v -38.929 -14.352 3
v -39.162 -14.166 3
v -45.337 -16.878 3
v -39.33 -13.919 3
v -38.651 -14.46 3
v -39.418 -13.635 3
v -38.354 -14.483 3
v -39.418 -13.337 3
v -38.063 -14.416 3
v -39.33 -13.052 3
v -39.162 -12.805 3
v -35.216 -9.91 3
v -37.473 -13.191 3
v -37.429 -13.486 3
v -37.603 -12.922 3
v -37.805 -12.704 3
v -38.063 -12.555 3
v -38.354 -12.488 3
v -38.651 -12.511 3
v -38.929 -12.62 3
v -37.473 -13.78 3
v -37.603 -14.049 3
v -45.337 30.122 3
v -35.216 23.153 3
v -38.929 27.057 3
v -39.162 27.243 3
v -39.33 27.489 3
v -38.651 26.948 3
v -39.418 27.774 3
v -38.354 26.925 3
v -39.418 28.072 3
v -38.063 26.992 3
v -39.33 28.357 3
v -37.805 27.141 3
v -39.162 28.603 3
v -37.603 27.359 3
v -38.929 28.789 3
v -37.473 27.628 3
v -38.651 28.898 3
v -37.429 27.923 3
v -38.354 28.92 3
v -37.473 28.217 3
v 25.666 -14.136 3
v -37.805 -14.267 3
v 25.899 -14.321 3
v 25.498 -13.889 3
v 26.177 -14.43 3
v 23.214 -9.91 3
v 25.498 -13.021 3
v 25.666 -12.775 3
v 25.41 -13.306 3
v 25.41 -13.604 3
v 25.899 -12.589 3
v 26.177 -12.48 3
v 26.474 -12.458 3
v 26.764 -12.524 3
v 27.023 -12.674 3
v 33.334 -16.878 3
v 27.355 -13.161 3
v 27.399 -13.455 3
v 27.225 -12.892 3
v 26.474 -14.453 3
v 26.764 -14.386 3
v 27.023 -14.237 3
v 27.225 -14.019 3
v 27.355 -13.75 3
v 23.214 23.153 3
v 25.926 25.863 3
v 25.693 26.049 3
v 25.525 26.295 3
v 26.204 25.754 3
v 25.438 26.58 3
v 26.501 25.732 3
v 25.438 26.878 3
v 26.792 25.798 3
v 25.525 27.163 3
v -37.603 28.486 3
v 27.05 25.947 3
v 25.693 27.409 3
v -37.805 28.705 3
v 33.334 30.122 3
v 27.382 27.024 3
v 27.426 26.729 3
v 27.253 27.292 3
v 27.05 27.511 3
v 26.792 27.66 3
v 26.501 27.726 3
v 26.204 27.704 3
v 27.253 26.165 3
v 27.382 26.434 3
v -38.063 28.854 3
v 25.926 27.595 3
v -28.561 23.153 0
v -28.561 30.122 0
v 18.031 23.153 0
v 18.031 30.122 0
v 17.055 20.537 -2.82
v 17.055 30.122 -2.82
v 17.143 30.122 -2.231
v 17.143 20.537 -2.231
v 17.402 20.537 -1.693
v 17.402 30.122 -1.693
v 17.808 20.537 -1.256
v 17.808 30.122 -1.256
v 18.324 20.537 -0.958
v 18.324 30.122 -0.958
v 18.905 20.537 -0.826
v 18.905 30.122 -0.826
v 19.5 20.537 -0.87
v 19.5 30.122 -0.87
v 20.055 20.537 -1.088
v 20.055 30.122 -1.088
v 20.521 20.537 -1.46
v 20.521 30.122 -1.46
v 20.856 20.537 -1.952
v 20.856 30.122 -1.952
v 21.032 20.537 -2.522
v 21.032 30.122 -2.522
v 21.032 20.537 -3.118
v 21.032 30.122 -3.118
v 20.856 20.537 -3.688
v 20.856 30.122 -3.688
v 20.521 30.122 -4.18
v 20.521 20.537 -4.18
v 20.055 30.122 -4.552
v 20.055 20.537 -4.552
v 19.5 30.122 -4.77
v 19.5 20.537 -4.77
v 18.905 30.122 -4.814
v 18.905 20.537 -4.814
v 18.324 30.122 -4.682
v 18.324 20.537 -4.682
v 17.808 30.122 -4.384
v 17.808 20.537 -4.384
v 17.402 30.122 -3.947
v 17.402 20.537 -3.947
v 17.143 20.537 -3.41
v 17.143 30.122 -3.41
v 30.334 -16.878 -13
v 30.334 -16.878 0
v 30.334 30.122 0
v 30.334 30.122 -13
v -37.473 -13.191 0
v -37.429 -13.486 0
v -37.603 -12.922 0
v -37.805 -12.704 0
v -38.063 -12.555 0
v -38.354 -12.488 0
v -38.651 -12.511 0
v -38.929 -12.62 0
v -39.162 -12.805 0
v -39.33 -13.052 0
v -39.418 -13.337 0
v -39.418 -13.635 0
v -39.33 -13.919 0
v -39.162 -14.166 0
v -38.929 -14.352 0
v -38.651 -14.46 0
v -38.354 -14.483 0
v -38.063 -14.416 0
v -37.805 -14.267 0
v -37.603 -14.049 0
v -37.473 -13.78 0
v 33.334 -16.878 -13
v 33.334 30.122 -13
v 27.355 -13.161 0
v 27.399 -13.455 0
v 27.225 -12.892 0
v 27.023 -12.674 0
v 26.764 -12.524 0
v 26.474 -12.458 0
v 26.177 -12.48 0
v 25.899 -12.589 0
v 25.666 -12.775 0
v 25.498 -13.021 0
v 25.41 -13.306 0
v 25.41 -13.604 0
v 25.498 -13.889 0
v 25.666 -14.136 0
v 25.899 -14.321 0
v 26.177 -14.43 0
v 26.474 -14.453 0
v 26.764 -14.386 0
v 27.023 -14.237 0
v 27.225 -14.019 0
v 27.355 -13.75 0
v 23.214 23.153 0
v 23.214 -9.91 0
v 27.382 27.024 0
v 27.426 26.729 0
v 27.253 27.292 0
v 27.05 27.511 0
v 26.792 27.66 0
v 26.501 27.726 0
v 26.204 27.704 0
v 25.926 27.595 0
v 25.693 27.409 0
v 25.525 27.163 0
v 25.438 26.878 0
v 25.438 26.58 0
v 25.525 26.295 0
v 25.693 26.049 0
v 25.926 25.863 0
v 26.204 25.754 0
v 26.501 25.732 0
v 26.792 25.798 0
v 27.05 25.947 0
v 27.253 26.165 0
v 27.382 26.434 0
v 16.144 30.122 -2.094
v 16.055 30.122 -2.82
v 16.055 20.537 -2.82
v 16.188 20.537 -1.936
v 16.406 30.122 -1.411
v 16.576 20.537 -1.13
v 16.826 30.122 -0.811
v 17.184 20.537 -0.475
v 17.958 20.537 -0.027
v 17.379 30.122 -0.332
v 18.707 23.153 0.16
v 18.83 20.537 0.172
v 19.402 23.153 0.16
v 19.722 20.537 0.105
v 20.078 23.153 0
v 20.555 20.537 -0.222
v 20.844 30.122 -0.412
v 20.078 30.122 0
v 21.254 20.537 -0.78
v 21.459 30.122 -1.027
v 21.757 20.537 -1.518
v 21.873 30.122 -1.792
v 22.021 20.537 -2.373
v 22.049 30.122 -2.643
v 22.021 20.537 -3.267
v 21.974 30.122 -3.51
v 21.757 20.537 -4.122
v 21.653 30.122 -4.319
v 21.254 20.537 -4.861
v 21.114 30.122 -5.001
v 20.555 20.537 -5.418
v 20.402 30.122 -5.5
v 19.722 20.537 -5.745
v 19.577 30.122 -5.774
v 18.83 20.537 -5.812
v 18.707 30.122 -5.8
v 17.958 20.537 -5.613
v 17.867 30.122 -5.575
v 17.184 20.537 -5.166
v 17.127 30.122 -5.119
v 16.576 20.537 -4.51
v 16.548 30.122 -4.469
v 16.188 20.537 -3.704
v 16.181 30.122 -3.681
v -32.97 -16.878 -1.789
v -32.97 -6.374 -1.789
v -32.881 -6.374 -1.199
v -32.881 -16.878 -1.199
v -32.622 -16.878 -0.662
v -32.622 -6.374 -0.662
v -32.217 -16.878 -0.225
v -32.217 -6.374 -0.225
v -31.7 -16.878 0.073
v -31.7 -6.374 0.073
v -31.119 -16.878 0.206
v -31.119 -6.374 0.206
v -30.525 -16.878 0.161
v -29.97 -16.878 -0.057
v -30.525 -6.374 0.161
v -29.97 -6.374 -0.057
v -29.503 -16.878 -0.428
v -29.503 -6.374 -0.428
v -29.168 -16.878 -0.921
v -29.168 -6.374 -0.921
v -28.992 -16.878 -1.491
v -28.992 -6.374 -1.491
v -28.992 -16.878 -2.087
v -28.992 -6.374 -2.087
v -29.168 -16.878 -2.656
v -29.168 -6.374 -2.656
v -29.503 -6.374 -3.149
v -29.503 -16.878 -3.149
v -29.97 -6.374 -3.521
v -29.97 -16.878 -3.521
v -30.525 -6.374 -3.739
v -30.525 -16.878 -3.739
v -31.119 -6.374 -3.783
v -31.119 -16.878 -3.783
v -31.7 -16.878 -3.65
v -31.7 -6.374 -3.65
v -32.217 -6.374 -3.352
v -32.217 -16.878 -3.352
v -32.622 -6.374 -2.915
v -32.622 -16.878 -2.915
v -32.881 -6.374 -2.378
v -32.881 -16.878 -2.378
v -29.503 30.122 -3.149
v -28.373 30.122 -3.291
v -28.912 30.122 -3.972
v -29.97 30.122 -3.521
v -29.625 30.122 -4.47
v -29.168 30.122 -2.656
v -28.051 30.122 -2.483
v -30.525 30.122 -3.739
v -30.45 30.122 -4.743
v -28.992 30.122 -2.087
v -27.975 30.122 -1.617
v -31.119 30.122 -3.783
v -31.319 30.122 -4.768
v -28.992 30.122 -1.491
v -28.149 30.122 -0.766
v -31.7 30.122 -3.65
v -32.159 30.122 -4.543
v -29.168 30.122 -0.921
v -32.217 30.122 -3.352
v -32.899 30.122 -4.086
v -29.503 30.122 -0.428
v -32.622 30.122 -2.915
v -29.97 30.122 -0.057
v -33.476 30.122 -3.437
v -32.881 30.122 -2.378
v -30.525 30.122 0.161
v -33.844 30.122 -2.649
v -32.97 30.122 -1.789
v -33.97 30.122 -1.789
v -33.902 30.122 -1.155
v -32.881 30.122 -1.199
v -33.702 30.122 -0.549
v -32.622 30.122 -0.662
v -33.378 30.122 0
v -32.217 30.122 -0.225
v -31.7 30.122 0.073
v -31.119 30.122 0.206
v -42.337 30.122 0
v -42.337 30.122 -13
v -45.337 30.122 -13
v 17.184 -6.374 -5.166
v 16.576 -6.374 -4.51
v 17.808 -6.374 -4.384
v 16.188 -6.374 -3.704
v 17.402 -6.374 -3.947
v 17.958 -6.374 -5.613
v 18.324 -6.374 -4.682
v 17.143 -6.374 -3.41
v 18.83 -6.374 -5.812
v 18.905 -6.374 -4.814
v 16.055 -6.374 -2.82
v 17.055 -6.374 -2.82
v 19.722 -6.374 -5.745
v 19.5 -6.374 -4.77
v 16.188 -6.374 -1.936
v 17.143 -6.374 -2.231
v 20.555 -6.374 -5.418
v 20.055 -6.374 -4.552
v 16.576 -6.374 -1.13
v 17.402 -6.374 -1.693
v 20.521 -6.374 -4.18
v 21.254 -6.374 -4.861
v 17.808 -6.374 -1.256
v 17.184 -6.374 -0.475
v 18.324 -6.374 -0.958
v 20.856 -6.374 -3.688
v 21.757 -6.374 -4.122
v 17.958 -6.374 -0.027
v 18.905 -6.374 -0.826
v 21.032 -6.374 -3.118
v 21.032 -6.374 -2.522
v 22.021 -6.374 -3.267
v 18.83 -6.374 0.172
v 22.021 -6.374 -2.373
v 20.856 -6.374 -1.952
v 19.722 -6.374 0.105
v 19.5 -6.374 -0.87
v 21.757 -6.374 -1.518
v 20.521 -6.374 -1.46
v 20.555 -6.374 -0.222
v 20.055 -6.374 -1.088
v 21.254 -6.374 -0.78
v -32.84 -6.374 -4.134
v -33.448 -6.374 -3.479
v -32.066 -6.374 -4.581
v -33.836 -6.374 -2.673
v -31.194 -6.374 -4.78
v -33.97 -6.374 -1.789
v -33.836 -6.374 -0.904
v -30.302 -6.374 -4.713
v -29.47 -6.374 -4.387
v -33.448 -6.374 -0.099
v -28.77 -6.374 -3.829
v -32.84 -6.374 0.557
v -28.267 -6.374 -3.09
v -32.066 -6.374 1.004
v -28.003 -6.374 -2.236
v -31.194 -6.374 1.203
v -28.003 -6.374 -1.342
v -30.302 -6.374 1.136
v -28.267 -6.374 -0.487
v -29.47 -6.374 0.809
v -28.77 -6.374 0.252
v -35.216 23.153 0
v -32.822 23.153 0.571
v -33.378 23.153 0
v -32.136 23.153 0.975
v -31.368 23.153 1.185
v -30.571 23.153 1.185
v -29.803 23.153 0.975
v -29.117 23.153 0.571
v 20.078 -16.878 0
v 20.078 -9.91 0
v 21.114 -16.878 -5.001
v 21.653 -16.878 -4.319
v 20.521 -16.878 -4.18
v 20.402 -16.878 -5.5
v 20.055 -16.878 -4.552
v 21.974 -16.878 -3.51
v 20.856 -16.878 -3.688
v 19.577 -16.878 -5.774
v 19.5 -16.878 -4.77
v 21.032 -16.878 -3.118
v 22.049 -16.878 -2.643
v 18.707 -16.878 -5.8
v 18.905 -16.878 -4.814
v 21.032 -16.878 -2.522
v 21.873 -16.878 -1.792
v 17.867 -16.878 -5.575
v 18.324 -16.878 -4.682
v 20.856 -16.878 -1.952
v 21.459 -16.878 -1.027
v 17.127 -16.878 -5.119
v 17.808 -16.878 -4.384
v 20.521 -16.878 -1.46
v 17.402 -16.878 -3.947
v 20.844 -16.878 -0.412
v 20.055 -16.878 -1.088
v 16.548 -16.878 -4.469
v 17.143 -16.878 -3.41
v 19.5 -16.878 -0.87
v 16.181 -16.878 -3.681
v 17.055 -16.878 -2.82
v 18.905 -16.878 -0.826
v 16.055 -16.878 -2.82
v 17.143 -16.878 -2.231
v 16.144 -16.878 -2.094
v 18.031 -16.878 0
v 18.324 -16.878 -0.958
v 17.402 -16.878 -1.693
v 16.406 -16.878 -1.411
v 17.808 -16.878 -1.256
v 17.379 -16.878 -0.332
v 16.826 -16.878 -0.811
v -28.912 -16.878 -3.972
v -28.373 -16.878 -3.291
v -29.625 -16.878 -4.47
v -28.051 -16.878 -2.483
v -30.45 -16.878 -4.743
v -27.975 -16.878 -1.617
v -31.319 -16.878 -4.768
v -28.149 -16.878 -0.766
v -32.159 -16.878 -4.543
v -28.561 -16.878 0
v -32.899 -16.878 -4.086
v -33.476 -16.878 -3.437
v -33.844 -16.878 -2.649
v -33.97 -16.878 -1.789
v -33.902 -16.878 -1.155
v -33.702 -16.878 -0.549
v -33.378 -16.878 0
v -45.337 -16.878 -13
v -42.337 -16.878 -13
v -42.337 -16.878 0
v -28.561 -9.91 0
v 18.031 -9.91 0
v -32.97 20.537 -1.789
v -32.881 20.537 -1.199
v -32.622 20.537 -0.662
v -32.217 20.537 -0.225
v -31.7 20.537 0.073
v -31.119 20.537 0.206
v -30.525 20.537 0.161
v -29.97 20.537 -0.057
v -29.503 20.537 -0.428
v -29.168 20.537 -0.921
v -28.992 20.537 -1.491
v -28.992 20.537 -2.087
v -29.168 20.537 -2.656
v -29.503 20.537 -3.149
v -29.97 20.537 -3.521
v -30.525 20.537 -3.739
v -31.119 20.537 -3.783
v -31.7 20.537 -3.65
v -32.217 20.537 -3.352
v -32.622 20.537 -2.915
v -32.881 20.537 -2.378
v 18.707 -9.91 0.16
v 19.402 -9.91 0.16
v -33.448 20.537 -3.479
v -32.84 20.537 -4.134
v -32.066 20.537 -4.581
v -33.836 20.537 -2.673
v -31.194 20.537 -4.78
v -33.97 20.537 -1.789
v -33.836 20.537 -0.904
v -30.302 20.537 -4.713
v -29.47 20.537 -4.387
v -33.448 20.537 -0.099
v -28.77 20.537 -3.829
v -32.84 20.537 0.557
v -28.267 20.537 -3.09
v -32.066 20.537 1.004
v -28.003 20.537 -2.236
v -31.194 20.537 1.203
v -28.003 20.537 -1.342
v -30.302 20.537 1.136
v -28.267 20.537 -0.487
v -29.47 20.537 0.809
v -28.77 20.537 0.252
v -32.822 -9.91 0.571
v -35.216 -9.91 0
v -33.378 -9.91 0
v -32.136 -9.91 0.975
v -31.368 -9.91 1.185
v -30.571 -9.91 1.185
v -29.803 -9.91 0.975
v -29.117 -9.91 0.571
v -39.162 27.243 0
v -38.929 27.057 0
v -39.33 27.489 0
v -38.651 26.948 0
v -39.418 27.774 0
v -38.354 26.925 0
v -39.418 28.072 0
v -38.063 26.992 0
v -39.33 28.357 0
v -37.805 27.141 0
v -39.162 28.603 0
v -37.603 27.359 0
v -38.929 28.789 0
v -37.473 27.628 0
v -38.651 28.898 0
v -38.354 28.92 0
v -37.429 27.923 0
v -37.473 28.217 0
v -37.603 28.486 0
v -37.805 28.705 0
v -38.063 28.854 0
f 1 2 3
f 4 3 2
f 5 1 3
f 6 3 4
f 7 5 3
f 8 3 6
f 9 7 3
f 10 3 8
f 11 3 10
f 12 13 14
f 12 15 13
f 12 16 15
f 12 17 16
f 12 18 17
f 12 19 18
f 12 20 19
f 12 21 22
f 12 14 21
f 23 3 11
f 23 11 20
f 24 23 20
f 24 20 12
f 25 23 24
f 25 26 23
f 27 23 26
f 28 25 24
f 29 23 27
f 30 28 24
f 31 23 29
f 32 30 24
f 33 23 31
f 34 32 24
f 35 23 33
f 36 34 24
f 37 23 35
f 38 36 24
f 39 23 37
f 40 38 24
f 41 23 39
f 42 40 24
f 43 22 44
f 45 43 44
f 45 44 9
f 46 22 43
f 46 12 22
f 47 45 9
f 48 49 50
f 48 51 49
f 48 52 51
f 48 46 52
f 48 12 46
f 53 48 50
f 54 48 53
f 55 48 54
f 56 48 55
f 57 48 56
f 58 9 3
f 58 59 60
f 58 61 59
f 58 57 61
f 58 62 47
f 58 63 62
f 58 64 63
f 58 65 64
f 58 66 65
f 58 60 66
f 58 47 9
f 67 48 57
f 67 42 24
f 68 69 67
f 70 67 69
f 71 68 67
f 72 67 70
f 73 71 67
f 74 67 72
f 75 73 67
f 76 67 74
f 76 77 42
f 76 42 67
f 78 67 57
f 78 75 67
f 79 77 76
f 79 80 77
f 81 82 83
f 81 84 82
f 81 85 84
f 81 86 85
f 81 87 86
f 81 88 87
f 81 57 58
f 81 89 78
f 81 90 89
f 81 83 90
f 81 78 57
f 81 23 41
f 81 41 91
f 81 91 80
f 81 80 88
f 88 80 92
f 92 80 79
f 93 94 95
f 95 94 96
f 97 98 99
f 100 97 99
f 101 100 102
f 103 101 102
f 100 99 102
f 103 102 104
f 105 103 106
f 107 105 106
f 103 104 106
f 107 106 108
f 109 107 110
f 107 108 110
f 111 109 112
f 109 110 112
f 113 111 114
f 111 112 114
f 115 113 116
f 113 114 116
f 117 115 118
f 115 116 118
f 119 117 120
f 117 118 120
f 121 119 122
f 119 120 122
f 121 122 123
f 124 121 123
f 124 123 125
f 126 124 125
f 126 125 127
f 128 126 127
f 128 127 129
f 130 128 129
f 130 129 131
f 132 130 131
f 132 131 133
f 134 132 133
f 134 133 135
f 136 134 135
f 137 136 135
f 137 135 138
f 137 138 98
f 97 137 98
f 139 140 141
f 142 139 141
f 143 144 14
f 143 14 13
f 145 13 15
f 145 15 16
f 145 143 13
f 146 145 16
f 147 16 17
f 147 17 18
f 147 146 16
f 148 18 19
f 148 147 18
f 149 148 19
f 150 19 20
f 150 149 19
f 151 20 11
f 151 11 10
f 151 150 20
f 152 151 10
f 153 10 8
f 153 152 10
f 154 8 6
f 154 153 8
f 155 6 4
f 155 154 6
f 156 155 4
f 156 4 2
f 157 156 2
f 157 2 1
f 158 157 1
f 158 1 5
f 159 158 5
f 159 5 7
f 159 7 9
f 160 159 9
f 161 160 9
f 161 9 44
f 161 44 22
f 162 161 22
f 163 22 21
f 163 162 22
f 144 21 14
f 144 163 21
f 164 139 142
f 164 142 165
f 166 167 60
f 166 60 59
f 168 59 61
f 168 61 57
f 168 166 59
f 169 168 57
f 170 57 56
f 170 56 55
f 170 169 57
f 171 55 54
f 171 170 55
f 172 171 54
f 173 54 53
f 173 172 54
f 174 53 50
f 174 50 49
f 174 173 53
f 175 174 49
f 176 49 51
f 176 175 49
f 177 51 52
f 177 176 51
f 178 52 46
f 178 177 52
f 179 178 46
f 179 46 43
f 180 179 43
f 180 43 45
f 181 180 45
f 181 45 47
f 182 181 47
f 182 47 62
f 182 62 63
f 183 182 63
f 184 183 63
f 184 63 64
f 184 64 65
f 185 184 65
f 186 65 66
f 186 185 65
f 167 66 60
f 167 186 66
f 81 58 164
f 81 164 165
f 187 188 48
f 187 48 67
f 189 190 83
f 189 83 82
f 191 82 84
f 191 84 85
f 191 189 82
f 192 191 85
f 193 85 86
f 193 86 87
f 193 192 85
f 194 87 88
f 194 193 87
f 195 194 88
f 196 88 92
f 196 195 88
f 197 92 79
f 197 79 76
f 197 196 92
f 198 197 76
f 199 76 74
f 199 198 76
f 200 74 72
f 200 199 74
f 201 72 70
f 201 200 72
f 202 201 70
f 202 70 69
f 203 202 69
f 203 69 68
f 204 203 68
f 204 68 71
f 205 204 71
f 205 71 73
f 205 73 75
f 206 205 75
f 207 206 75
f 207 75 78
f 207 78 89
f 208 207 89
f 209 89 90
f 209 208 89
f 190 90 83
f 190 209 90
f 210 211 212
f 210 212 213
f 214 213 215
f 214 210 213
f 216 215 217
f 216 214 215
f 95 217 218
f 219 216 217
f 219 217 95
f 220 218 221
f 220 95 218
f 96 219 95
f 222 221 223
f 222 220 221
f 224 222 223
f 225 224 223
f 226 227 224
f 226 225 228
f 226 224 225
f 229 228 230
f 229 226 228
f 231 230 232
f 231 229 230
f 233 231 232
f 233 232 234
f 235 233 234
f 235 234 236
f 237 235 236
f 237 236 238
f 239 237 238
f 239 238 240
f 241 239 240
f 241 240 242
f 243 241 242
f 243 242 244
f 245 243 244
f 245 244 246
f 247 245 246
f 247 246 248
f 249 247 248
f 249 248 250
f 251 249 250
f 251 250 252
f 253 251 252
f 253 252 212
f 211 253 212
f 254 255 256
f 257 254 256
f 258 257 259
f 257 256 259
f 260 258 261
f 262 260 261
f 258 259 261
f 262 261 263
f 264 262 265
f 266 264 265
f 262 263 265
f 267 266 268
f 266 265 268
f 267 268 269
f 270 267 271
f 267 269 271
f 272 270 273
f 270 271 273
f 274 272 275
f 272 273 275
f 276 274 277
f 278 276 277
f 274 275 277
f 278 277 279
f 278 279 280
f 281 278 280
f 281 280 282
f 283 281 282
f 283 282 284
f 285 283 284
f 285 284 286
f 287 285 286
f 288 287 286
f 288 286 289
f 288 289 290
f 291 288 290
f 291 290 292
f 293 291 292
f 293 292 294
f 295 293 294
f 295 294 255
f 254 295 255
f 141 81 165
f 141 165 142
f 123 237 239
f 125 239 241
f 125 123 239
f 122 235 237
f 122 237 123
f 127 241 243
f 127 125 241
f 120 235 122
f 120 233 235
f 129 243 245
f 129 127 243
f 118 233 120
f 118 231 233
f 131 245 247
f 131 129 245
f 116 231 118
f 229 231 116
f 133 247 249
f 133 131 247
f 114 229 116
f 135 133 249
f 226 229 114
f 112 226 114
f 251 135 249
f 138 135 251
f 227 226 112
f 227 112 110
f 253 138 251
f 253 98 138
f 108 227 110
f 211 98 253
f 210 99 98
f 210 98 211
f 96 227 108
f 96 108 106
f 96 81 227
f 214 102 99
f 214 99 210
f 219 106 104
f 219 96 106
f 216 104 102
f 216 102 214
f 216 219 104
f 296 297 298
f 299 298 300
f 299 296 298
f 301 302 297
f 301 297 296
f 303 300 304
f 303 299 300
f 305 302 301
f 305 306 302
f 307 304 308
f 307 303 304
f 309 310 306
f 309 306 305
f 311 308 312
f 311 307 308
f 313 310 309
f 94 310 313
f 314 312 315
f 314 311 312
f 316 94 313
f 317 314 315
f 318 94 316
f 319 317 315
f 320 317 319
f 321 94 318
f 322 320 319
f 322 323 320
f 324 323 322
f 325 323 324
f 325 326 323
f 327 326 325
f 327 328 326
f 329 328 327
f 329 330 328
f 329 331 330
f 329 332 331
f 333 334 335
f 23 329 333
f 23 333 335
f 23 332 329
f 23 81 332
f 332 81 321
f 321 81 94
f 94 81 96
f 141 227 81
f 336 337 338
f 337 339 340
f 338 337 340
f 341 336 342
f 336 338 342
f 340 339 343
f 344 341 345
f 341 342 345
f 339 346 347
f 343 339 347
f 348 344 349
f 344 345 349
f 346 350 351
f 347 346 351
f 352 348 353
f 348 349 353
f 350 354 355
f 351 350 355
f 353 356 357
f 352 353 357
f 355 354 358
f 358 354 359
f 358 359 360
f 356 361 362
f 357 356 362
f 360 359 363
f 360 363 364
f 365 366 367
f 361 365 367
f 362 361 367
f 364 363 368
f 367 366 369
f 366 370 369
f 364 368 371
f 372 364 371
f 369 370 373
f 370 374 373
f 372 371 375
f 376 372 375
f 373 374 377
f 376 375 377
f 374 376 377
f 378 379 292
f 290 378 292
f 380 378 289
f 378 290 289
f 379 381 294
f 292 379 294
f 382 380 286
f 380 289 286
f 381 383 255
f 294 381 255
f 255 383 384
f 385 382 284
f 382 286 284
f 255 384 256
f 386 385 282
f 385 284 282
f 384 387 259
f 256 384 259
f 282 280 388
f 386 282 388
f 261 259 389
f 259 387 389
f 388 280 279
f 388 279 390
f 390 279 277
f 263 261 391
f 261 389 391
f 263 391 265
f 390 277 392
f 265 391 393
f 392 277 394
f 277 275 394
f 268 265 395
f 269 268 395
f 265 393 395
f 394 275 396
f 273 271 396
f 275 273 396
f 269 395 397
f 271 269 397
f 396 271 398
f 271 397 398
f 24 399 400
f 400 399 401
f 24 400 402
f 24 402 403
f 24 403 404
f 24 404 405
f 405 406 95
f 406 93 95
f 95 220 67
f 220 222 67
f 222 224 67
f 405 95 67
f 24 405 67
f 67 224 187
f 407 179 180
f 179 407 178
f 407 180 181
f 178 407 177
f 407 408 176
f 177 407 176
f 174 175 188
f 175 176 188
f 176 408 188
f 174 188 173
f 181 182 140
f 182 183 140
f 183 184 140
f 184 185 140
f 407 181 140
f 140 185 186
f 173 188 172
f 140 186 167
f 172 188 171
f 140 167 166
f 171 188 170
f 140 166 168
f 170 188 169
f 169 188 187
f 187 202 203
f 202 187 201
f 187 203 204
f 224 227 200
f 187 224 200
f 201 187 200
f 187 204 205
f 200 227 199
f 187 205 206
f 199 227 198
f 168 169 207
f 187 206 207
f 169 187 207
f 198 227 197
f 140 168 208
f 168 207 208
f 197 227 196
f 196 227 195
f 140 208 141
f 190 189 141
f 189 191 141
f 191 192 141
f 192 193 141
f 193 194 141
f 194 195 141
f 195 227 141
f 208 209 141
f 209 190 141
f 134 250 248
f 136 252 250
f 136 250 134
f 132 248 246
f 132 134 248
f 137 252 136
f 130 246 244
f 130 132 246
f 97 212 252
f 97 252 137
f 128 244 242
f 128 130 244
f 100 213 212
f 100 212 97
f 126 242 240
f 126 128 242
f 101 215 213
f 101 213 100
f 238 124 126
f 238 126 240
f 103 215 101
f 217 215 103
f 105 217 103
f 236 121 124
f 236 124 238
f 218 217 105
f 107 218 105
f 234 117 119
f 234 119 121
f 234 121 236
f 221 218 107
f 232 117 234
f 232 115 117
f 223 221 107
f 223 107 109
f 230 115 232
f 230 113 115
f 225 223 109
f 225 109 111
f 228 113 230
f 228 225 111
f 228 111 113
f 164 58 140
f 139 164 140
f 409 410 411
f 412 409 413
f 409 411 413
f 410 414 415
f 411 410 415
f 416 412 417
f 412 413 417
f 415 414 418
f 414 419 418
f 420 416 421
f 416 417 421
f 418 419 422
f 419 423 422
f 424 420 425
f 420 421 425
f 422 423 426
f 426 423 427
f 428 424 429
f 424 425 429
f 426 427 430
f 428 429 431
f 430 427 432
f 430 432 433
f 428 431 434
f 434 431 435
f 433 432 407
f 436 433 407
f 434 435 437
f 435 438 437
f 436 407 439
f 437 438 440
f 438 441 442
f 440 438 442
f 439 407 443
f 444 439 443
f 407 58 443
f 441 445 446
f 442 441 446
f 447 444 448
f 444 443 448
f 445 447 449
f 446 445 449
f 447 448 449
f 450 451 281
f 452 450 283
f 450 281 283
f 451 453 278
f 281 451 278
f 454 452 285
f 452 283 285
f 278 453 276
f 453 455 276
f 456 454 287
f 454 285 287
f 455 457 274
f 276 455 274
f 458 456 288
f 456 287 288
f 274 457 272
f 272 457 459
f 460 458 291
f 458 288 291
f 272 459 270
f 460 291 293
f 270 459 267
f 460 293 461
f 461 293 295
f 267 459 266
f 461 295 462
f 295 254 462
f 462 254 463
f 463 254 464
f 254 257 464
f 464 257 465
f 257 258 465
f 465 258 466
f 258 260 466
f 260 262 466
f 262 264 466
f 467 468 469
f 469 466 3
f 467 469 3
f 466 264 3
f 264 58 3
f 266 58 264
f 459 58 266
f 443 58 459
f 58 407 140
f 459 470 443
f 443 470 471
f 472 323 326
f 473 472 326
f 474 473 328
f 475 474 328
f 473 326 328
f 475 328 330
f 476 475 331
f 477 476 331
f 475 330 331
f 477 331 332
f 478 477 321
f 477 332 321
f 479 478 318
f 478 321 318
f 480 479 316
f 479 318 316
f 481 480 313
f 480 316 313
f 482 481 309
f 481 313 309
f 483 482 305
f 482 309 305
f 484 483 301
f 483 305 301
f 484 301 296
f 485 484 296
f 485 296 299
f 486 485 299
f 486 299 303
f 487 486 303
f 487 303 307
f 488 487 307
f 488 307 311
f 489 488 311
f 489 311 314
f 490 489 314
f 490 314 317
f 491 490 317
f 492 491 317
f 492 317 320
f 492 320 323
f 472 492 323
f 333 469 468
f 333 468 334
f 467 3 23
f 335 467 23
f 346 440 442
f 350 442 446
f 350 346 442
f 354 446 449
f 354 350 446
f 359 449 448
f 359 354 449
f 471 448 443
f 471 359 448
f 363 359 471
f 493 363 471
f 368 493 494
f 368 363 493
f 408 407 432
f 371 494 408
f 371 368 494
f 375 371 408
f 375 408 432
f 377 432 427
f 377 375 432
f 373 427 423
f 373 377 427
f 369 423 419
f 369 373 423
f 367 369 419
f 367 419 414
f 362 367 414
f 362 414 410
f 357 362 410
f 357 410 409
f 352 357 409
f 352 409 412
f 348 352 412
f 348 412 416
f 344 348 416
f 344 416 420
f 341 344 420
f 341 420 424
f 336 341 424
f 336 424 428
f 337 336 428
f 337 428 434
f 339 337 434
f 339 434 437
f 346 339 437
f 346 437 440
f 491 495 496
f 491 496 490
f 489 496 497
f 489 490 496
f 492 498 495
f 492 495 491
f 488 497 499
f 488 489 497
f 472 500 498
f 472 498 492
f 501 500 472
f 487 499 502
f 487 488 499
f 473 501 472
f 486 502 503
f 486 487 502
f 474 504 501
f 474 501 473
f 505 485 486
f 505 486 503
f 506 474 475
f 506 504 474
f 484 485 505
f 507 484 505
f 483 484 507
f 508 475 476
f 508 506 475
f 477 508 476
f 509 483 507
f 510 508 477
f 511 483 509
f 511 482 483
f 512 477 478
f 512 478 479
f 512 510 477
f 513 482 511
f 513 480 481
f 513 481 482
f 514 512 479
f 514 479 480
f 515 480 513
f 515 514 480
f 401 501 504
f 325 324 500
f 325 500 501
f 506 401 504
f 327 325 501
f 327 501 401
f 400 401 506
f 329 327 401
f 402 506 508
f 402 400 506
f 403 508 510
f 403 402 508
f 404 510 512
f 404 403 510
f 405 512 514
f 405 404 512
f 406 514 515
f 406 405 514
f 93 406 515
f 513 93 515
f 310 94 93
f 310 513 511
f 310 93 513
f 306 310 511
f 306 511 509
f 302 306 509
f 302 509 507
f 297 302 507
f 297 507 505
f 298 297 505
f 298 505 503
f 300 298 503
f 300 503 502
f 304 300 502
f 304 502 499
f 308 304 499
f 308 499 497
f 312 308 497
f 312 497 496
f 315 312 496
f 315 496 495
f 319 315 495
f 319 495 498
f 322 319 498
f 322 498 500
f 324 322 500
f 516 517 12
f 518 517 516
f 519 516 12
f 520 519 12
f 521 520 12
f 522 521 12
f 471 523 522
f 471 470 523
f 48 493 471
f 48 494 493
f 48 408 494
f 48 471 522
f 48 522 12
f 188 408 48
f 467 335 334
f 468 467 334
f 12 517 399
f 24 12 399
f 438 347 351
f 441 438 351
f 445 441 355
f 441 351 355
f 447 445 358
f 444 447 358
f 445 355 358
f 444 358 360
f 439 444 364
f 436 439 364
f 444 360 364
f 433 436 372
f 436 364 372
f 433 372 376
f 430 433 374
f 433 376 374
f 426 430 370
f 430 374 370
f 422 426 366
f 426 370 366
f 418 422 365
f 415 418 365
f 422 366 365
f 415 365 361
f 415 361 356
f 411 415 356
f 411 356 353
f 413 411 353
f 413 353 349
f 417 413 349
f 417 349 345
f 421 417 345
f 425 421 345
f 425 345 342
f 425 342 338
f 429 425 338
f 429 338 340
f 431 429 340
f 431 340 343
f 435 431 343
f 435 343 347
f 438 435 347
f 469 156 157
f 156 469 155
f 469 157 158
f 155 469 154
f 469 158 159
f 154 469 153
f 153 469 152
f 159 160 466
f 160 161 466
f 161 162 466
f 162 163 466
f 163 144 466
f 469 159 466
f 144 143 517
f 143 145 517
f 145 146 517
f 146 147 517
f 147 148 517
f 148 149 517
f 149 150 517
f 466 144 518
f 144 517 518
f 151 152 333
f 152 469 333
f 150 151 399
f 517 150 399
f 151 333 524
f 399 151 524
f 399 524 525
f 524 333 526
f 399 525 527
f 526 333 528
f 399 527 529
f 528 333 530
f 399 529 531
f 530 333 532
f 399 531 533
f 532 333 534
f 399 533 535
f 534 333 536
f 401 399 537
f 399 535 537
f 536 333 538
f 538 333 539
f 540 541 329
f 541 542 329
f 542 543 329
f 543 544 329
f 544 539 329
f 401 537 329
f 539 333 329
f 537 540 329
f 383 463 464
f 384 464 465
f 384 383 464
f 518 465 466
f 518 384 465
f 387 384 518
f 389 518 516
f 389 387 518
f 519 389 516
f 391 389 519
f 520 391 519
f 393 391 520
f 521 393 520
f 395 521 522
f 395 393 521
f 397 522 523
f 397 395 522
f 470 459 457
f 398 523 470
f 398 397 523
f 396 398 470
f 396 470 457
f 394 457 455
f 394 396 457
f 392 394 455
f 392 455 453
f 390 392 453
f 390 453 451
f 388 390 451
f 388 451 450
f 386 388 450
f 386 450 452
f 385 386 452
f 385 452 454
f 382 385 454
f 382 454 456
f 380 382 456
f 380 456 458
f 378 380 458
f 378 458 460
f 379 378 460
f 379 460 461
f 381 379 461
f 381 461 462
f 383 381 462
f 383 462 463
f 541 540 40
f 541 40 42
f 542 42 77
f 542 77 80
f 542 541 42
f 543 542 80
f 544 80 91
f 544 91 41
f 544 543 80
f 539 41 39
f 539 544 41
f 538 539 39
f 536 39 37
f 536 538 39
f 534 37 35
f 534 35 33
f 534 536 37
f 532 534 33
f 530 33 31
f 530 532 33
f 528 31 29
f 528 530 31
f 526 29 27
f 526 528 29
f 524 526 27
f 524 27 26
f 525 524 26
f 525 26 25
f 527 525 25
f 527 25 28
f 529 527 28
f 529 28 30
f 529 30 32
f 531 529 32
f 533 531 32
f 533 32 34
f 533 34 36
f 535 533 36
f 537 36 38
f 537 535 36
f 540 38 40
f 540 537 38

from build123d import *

# Parameters (mm, degrees)
F0_W     = 72.6709449252
F0_H     = 47
F0_R     = 1
F0_W_2   = 58.4303468724
F0_H_2   = 33.0635516279
F1_DEPTH = 3
F2_W     = 3
F2_H     = 47
F3_DEPTH = 16
F4_R     = 3
F5_DEPTH = 47
F6_R     = 2
F7_DEPTH = 59
F8_W     = 58.4303468724
F8_H     = 26.9109723158
F9_DEPTH = 25


with BuildPart() as f1:
    # F0 (on Top) → F1 (new body)
    with BuildSketch(Plane.XY):
        with Locations((-6.0011862931, 6.6216193669)):
            Rectangle(F0_W, F0_H)
        with Locations((-38.4287770241, -13.4855430331)):
            Circle(F0_R, mode=Mode.SUBTRACT)
        with Locations((-6.0011862931, 6.6216193669)):
            Rectangle(F0_W_2, F0_H_2, mode=Mode.SUBTRACT)
        with Locations((26.3990384156, -13.4553477725)):
            Circle(F0_R, mode=Mode.SUBTRACT)
        with Locations((-38.4287770241, 27.9226825441)):
            Circle(F0_R, mode=Mode.SUBTRACT)
        with Locations((26.426404438, 26.7287817669)):
            Circle(F0_R, mode=Mode.SUBTRACT)
    extrude(amount=F1_DEPTH)

    # F2 (on face) → F3 (join)
    with BuildSketch(Plane.XY.offset(3)):
        with Locations((31.8342861695, 6.6216193669)):
            Rectangle(F2_W, F2_H)
        with Locations((-43.8366587557, 6.6216193669)):
            Rectangle(F2_W, F2_H)
    extrude(amount=-F3_DEPTH)

    # F4 (on face) → F5 (join)
    with BuildSketch(Plane(origin=(0, 30.1216193669, 0), x_dir=(-1, 0, 0), z_dir=(0, 1, 0))):
        with Locations((-19.05452002, -2.8200918249)):
            Circle(F4_R)
        with Locations((30.9695991276, -1.7886548301)):
            Circle(F4_R)
    extrude(amount=-F5_DEPTH)

    # F6 (on face) → F7 (cut)
    with BuildSketch(Plane(origin=(0, 30.1216193669, 0), x_dir=(-1, 0, 0), z_dir=(0, 1, 0))):
        with Locations((30.9695991276, -1.7886548301)):
            Circle(F6_R)
        with Locations((-19.05452002, -2.8200918249)):
            Circle(F6_R)
    extrude(amount=-F7_DEPTH, mode=Mode.SUBTRACT)

    # F8 (on face) → F9 (cut)
    with BuildSketch(Plane.XY.offset(3)):
        with Locations((-6.0011862931, 7.0818343665)):
            Rectangle(F8_W, F8_H)
    extrude(amount=-F9_DEPTH, mode=Mode.SUBTRACT)


solid = f1.part
